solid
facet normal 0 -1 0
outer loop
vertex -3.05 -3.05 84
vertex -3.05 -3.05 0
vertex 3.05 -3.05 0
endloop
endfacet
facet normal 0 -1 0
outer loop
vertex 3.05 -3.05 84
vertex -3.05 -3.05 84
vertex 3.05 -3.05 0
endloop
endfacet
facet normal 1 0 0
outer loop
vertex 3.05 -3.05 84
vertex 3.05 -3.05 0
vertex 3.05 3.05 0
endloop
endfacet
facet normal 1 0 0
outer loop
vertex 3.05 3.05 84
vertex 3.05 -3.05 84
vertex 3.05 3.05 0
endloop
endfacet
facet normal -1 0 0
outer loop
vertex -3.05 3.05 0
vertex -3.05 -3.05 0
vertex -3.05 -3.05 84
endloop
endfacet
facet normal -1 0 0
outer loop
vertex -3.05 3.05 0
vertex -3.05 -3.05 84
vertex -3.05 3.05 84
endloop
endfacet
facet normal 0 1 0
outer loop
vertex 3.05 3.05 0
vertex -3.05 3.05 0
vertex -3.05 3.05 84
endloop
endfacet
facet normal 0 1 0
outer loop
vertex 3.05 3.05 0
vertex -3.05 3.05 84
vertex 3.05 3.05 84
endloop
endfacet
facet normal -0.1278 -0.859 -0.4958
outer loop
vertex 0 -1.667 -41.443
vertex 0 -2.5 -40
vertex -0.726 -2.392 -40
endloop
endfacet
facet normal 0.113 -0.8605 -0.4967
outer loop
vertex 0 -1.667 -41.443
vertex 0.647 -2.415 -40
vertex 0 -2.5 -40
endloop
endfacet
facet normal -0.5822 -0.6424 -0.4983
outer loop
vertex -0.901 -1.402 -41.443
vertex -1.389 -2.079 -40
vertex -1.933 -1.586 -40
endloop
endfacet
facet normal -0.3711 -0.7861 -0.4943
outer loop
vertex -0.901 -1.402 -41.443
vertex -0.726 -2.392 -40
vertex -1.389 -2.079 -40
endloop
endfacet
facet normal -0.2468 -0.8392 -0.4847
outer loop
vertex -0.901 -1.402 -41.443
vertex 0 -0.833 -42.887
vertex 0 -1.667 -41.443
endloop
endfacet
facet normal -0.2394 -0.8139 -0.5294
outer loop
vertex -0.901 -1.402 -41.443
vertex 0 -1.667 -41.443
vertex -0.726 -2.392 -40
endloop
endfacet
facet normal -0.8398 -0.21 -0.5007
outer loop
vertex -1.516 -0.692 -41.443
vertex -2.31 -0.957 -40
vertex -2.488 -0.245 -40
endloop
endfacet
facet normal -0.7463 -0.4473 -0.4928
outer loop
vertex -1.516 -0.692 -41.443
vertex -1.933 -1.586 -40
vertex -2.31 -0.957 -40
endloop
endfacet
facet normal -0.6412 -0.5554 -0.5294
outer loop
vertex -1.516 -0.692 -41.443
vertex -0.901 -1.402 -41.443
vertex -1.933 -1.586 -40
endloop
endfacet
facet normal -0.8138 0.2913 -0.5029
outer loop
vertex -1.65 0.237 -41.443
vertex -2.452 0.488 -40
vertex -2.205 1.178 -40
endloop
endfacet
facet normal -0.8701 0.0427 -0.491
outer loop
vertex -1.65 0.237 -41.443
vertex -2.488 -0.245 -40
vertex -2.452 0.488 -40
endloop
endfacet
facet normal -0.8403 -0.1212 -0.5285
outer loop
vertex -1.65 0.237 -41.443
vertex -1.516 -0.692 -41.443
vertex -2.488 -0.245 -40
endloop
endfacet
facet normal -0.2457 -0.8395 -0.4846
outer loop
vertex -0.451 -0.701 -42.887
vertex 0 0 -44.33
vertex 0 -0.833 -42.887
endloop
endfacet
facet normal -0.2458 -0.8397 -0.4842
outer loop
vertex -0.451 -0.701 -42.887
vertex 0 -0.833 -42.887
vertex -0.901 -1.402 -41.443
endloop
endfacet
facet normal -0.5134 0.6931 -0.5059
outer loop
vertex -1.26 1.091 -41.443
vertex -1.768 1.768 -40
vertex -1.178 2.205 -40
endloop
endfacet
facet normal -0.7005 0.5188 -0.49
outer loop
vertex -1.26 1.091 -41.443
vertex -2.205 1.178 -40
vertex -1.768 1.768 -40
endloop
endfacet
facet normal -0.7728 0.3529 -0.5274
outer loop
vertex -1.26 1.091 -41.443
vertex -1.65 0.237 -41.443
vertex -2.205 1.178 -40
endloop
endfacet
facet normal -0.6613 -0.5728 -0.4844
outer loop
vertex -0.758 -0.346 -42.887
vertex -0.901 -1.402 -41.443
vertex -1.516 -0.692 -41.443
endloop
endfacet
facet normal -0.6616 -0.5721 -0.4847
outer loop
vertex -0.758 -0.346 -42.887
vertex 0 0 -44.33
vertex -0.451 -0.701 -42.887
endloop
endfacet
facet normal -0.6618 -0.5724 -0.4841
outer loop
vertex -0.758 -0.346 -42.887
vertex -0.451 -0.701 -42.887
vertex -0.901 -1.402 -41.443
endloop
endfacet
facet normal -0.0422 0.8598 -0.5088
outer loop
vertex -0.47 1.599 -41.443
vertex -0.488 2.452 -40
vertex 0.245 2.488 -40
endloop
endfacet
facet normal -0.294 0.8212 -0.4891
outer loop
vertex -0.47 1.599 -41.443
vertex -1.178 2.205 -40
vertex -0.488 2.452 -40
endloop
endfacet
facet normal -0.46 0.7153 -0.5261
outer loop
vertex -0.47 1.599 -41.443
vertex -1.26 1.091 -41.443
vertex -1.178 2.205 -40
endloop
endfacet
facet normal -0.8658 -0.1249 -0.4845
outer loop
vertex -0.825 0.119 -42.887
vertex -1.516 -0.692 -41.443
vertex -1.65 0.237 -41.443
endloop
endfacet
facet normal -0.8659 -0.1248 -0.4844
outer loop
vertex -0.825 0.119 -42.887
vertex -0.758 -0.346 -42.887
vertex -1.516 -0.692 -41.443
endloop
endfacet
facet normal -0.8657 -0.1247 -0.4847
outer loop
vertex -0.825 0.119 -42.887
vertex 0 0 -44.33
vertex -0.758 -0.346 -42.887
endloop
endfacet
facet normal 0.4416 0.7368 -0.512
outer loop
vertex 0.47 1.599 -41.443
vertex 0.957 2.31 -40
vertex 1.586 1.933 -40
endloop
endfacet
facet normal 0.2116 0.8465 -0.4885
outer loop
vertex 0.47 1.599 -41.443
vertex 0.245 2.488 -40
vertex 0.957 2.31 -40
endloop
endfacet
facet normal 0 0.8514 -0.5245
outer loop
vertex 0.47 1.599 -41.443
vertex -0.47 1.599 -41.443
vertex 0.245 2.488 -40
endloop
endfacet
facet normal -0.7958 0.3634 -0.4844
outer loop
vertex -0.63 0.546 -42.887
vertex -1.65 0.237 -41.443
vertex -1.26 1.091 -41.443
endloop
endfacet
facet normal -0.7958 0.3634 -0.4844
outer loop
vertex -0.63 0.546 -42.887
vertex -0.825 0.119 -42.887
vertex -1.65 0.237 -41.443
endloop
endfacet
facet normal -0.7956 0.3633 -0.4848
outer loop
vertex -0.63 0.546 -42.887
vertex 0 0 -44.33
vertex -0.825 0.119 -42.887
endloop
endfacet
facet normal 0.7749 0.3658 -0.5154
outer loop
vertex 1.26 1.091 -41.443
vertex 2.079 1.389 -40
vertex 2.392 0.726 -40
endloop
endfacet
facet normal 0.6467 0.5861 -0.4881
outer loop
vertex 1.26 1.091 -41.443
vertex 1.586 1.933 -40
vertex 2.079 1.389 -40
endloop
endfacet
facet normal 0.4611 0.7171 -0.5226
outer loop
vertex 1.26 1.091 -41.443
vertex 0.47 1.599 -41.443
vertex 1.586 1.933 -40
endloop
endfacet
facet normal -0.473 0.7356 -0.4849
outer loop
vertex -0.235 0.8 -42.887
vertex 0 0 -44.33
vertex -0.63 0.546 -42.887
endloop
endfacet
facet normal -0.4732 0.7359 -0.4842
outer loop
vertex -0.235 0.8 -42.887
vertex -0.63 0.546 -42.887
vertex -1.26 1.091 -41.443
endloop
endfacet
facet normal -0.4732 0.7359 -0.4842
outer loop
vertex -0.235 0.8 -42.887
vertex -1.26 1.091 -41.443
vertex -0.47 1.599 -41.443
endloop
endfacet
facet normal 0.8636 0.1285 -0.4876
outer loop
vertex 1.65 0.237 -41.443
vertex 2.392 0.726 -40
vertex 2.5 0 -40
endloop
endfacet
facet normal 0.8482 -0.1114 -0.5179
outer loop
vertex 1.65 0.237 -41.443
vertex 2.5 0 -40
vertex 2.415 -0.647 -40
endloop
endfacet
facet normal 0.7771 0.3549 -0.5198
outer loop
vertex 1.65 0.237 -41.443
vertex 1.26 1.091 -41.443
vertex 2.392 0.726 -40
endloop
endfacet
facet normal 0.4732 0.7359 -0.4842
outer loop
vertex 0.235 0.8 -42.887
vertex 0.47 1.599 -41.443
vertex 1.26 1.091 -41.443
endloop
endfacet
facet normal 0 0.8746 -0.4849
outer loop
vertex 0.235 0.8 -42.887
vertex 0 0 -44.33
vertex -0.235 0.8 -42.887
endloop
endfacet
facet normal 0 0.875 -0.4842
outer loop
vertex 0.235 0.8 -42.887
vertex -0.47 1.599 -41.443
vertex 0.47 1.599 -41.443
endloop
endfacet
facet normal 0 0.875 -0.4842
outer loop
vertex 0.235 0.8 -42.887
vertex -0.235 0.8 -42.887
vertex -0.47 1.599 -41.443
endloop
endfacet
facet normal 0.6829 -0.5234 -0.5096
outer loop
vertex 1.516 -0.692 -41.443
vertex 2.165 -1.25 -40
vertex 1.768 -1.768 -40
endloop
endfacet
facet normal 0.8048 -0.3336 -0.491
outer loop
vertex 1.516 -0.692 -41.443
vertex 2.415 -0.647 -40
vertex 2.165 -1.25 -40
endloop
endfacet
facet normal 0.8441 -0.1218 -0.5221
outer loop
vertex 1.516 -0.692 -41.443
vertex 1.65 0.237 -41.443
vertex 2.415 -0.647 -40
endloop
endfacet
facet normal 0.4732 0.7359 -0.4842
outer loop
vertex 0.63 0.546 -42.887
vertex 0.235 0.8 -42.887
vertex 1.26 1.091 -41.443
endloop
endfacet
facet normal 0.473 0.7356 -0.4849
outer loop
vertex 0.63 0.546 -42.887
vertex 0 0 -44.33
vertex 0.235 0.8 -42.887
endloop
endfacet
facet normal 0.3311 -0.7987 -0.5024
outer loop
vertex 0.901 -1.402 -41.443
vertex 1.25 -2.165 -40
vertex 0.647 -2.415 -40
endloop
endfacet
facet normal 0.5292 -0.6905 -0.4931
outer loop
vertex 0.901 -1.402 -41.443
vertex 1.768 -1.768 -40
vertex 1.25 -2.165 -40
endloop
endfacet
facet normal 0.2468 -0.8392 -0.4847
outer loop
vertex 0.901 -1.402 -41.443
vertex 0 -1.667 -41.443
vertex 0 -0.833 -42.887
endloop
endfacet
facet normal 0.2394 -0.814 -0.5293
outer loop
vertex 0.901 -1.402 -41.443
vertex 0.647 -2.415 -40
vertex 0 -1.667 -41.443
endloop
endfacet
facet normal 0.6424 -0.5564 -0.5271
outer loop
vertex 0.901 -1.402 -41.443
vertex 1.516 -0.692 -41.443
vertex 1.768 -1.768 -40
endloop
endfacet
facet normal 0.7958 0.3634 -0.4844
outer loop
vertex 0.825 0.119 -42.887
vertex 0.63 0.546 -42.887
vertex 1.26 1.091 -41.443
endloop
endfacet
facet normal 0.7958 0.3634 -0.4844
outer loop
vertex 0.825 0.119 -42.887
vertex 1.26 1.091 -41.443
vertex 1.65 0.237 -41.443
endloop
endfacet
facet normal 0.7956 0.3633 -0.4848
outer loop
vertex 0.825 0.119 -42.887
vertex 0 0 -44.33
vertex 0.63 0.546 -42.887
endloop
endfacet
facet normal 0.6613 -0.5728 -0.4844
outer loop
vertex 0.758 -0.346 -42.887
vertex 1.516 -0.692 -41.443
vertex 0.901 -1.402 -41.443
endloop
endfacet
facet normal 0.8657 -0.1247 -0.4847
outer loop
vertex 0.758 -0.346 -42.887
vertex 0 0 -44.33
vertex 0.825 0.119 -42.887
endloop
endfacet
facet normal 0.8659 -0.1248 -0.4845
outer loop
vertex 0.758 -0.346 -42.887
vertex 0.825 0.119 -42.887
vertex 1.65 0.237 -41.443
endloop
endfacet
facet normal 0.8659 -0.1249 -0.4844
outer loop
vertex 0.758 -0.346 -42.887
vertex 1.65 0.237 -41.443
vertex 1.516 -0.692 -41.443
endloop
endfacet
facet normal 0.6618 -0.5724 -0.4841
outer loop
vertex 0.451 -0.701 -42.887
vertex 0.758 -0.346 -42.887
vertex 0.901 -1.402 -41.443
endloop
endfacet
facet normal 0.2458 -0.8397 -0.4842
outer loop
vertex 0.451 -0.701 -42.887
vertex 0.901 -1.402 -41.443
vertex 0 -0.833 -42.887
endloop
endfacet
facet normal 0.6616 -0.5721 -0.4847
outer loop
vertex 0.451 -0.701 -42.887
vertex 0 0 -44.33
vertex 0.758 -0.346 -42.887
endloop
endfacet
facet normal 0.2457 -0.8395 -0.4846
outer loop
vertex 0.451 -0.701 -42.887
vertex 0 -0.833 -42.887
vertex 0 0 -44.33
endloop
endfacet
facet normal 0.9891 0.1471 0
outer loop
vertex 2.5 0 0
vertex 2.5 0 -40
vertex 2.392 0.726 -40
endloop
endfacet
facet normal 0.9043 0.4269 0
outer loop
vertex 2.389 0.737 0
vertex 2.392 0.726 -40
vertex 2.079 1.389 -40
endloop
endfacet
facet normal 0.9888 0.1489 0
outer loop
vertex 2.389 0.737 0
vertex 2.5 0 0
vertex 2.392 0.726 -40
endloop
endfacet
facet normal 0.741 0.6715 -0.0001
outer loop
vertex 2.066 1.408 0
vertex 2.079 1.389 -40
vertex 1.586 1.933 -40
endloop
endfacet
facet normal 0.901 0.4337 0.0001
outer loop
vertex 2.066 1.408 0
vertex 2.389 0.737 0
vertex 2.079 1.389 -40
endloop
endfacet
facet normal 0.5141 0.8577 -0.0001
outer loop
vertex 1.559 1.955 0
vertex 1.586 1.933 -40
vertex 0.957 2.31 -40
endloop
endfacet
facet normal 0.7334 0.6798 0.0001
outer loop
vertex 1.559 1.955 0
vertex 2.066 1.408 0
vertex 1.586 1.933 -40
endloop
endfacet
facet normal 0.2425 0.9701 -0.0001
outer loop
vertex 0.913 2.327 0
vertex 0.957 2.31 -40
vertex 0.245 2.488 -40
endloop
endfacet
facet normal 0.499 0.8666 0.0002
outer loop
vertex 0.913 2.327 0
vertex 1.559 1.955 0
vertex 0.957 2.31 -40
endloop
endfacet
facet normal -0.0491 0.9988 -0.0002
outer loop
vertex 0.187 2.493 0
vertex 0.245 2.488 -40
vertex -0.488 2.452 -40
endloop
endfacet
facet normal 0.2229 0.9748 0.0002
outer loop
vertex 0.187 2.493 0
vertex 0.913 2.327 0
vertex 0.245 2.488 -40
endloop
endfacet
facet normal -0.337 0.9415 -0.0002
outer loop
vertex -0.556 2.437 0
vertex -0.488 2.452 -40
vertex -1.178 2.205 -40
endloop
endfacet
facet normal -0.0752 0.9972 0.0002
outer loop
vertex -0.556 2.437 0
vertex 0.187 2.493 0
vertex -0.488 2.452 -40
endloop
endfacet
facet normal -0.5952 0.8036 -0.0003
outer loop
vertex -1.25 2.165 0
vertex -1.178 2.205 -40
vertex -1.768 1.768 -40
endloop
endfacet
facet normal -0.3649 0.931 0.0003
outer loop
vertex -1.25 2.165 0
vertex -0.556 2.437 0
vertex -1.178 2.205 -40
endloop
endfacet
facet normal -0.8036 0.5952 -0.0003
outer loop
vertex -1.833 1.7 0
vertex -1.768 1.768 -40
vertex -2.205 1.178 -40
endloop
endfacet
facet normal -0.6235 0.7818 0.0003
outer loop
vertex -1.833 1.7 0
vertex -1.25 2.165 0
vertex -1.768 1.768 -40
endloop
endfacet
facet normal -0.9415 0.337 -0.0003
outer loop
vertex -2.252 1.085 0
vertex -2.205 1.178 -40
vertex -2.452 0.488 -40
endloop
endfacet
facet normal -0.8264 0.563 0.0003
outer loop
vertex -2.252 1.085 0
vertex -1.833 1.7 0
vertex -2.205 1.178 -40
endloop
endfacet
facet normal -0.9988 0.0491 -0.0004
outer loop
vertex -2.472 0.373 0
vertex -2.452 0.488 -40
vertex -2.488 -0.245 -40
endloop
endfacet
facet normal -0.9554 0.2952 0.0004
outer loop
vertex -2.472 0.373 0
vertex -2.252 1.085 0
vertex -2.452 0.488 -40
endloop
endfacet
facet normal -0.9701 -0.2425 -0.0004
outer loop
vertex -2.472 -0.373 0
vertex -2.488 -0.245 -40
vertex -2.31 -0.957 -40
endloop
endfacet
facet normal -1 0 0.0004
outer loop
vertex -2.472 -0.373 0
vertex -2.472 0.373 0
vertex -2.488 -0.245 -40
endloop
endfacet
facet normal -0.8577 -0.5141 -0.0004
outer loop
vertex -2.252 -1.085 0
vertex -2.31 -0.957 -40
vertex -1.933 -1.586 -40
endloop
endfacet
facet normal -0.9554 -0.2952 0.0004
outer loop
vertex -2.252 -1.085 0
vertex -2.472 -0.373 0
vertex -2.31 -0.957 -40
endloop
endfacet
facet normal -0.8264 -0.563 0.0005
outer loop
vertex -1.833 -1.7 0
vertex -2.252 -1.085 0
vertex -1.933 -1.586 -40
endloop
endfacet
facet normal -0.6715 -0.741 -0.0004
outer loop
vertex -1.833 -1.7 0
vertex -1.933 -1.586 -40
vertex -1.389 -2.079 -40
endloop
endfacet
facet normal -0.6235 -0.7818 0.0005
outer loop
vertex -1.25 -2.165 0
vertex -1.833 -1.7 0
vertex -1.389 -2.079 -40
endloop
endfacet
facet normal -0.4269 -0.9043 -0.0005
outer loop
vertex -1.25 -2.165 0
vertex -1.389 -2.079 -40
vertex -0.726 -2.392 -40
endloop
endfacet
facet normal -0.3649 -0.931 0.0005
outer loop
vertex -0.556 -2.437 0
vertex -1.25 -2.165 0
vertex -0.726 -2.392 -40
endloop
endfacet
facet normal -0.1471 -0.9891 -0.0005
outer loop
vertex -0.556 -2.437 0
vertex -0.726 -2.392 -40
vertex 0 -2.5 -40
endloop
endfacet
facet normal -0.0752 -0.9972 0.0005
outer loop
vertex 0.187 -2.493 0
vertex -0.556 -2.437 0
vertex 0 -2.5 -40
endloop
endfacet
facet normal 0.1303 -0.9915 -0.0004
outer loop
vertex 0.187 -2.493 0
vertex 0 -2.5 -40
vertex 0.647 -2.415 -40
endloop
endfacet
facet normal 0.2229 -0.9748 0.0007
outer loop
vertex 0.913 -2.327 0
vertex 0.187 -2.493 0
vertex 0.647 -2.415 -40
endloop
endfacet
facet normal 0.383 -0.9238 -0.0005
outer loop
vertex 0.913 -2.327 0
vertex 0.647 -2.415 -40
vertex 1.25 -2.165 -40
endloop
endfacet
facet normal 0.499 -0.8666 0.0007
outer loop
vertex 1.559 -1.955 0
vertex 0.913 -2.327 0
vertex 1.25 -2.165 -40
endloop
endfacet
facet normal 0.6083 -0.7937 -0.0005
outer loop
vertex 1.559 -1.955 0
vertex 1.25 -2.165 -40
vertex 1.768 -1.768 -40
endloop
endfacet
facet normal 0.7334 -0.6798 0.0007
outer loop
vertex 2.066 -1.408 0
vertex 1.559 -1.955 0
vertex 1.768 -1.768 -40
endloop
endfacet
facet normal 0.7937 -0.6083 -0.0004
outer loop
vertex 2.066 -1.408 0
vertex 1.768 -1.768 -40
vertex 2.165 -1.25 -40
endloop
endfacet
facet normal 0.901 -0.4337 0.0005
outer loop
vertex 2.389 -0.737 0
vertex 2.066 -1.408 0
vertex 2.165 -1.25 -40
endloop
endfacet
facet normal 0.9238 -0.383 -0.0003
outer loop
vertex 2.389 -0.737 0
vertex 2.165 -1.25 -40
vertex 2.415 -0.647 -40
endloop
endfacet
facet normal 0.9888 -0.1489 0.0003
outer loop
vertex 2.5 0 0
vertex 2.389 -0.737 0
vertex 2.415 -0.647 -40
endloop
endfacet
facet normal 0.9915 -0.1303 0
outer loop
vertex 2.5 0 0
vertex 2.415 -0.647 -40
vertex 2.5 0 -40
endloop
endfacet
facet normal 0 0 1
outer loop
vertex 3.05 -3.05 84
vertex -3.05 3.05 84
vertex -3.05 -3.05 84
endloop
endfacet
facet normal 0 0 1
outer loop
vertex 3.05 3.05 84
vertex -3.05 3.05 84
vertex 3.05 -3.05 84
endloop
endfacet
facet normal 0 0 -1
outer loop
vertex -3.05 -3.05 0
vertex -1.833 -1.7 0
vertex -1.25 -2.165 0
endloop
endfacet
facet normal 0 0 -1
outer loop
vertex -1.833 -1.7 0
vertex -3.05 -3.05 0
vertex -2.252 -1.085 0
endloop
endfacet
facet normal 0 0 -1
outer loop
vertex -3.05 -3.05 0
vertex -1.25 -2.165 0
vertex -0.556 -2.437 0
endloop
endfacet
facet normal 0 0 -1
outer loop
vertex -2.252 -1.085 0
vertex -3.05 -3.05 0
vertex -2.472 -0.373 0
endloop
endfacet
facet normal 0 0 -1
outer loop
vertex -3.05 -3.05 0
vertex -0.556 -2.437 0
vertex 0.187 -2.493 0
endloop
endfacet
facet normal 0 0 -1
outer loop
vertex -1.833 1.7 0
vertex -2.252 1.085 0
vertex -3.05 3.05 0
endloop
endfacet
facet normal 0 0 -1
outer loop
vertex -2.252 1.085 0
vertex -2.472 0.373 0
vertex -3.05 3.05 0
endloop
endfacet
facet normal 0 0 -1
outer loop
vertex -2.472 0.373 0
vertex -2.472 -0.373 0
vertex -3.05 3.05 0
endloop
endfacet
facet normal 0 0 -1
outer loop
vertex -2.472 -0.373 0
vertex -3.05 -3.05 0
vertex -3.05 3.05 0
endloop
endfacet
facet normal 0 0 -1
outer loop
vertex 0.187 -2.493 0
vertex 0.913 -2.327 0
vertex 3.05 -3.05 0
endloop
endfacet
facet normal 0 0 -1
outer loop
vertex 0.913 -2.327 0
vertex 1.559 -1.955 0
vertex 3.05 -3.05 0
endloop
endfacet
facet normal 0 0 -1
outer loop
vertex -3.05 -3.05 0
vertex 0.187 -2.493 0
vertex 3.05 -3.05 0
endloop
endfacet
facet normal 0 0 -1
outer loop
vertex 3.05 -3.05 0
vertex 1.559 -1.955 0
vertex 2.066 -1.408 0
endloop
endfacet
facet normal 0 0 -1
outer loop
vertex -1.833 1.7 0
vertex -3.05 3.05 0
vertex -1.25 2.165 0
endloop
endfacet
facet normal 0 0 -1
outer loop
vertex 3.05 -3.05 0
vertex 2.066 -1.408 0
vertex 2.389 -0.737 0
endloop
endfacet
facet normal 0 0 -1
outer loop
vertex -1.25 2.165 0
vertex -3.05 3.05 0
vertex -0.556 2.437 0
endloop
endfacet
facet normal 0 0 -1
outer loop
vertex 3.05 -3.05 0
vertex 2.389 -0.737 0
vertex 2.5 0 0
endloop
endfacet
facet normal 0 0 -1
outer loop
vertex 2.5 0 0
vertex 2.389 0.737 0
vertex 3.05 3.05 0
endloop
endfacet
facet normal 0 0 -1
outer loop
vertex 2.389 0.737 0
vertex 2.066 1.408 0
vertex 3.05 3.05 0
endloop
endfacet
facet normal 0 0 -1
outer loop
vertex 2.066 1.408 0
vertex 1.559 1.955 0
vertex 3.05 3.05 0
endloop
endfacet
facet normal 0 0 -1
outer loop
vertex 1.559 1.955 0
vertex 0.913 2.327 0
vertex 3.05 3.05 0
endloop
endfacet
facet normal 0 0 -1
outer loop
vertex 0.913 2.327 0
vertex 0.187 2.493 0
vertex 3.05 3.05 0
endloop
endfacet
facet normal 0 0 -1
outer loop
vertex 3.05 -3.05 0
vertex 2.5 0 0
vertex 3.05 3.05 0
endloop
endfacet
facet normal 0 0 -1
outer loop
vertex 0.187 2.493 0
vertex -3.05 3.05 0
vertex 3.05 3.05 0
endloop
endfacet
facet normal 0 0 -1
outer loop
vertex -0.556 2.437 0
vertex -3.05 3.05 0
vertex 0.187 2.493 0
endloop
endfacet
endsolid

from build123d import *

# Parameters (mm, degrees)
BOSS_EXTRUDE1_OUTLINE_W = 6.1
BOSS_EXTRUDE1_OUTLINE_H = 6.1
BOSS_EXTRUDE1_DEPTH     = 84
SKETCH1_4_R             = 2.5
BOSS_EXTRUDE2_DEPTH     = 40


# Read off the part's stored shape, not the designer's step: Boss-Extrude1
with BuildPart() as part:
    # Boss-Extrude1 outline → Boss-Extrude1 (new body)
    with BuildSketch(Plane.XY):
        Rectangle(BOSS_EXTRUDE1_OUTLINE_W, BOSS_EXTRUDE1_OUTLINE_H)
    extrude(amount=BOSS_EXTRUDE1_DEPTH)

    # Sketch1<4> → Boss-Extrude2 (add)
    with BuildSketch(Plane.XY):
        Circle(SKETCH1_4_R)
    extrude(amount=-BOSS_EXTRUDE2_DEPTH)

    # Boss-Extrude3 cone 1 section (through the dimple's axis) → Boss-Extrude3 (revolve)
    with BuildSketch(Plane(origin=(0, 0, -40), x_dir=(0, -1, 0), z_dir=(1, 0, 0))):
        Polygon((0, 0), (2.5, 0), (0, 4.330127019), align=None)
    revolve(axis=Axis((0, 0, -40), (0, 0, -1)))


solid = part.part
